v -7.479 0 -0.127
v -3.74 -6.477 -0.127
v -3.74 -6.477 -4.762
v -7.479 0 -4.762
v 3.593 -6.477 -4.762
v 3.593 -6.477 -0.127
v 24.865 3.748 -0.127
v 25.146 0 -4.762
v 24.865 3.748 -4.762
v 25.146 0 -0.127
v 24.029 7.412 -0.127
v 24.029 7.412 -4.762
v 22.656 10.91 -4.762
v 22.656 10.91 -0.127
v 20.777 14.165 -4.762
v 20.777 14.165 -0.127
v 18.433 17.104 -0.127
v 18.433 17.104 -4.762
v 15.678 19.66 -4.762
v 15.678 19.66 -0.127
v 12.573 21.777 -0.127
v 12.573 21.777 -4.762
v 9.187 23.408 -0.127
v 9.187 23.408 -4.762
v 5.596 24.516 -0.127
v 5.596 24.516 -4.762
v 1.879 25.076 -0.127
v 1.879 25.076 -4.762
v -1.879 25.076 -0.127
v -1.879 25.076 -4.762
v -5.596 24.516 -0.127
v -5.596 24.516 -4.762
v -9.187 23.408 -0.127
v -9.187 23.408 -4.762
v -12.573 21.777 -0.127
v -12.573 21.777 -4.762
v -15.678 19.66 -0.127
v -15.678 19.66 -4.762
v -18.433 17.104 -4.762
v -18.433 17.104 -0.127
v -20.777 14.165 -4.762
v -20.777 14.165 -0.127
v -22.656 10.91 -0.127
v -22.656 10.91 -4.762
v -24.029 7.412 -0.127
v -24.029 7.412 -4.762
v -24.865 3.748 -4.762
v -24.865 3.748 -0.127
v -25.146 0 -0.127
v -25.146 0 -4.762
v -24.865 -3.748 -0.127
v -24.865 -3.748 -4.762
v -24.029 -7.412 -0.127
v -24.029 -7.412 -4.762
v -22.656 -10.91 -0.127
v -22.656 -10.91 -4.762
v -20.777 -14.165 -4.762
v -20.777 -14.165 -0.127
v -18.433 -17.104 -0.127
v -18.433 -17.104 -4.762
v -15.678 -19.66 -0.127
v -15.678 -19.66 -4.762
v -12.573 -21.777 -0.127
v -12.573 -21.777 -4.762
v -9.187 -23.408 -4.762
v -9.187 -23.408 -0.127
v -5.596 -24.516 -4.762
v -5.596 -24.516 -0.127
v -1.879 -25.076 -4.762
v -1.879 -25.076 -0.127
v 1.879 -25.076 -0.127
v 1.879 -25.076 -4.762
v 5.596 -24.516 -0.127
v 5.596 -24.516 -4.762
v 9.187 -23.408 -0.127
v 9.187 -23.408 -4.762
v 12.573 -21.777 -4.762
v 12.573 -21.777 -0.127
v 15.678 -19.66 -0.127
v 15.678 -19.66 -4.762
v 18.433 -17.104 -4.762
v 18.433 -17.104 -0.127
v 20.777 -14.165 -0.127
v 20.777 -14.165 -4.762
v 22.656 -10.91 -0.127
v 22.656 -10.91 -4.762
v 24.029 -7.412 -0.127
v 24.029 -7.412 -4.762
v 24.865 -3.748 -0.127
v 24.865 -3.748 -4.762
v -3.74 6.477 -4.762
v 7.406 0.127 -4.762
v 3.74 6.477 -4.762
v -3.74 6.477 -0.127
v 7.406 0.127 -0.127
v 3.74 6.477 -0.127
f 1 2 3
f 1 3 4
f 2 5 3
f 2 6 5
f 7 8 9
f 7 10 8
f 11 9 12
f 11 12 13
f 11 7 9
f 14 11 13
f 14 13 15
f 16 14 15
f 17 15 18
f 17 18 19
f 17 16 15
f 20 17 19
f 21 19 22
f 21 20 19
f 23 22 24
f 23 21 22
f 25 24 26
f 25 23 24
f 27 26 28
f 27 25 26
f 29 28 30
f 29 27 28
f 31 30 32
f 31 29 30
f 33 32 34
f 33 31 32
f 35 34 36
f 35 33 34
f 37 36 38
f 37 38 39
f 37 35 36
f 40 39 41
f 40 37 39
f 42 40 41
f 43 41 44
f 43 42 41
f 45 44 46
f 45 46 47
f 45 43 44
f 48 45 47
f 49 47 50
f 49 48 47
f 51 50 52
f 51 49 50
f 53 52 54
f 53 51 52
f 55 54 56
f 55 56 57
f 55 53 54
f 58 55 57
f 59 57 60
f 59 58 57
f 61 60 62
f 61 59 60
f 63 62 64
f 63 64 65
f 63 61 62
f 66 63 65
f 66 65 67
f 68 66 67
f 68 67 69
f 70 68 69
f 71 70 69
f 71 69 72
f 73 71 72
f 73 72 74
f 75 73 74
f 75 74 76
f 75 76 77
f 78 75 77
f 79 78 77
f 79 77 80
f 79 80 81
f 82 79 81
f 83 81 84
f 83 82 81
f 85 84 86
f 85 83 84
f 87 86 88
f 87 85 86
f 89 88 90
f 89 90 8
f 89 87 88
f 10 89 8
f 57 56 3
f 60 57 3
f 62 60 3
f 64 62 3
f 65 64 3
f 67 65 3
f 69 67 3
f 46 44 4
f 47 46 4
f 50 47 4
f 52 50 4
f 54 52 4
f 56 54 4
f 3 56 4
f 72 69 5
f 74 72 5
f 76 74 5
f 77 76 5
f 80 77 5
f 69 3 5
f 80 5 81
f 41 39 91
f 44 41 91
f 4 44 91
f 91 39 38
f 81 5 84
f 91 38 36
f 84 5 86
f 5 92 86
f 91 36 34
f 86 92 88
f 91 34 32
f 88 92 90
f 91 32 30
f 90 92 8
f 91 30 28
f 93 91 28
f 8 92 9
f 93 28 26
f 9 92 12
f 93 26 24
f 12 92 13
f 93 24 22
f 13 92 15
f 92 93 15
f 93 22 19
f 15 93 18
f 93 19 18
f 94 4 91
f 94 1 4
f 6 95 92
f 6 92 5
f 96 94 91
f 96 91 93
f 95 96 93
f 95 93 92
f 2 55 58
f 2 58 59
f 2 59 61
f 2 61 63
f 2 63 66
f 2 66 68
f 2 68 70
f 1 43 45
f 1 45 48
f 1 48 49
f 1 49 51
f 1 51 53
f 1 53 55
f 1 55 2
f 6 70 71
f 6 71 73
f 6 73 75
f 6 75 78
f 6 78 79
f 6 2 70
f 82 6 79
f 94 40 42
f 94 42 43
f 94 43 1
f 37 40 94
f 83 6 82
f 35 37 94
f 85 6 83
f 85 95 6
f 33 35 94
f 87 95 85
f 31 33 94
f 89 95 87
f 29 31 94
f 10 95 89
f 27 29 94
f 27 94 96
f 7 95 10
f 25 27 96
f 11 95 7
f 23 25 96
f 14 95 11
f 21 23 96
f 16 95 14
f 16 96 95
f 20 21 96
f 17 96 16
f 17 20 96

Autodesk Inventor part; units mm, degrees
ref_plane "YZ Plane" through (0, 0, 0) normal (1, 0, 0) x (0, 1, 0)
ref_plane "XZ Plane" through (0, 0, 0) normal (0, 1, 0) x (-1, 0, 0)
ref_plane "XY Plane" through (0, 0, 0) normal (0, 0, 1) x (1, 0, 0)
sketch "Sketch1" plane through (0, 0, 0) normal (0, 0, 1) x (1, 0, 0)
  line L0 (3.6662, 6.35) -> (7.3323, 0)
  line L1 (7.3323, 0) -> (3.6662, -6.35)
  line L2 (3.6662, -6.35) -> (-3.6662, -6.35)
  line L3 (-3.6662, -6.35) -> (-7.3323, 0)
  line L4 (-7.3323, 0) -> (-3.6662, 6.35)
  line L5 (-3.6662, 6.35) -> (3.6662, 6.35)
  circle A0 centre (0, 0) radius 25.273
  circle A1 centre (0, 0) radius 7.3323 construction
  dimension "d0" = 12.7
  dimension "d2" = 50.546
  dimension "d3" = 17.9407
extrude "Extrusion1" add sketch "Sketch1" against normal blind 4.7625
thicken "Reduce Outside Diameter" operation add thickness 0.127 both sides no extend neighbours yes toward (-0.9967573, 0.0804666, 0) faces at (25.191, -2.0336, -3.175)
thicken "Thicken2" operation add thickness 0.127 both sides no extend neighbours yes toward (-0.8660254, -0.5, 0) faces at (-4.8882, -4.2333, -1.5875) (-6.1103, 2.1167, -1.5875) (-1.2221, 6.35, -1.5875) (4.8882, 4.2333, -1.5875) (11.0881, 6.012, 0) (1.2221, -6.35, -1.5875)
equation "\"d0\" = hexSize"
equation "\"d2\" = externalDiameter - 2 * printSpacing"
equation "\"d4\" = thickness"
equation "\"d6\" = printSpacing"
equation "\"d7\" = printSpacing"
equation "\"d8\" = printSpacing"
equation "\"d9\" = printSpacing"
equation "\"hexSize\" = 12.7"
equation "\"externalDiameter\" = 50.8"
equation "\"thickness\" = 4.7625"
equation "\"printSpacing\" = 0.127"
properties part number "1_2x2x3_16-hexBearing" material "PC/ABS Plastic"
